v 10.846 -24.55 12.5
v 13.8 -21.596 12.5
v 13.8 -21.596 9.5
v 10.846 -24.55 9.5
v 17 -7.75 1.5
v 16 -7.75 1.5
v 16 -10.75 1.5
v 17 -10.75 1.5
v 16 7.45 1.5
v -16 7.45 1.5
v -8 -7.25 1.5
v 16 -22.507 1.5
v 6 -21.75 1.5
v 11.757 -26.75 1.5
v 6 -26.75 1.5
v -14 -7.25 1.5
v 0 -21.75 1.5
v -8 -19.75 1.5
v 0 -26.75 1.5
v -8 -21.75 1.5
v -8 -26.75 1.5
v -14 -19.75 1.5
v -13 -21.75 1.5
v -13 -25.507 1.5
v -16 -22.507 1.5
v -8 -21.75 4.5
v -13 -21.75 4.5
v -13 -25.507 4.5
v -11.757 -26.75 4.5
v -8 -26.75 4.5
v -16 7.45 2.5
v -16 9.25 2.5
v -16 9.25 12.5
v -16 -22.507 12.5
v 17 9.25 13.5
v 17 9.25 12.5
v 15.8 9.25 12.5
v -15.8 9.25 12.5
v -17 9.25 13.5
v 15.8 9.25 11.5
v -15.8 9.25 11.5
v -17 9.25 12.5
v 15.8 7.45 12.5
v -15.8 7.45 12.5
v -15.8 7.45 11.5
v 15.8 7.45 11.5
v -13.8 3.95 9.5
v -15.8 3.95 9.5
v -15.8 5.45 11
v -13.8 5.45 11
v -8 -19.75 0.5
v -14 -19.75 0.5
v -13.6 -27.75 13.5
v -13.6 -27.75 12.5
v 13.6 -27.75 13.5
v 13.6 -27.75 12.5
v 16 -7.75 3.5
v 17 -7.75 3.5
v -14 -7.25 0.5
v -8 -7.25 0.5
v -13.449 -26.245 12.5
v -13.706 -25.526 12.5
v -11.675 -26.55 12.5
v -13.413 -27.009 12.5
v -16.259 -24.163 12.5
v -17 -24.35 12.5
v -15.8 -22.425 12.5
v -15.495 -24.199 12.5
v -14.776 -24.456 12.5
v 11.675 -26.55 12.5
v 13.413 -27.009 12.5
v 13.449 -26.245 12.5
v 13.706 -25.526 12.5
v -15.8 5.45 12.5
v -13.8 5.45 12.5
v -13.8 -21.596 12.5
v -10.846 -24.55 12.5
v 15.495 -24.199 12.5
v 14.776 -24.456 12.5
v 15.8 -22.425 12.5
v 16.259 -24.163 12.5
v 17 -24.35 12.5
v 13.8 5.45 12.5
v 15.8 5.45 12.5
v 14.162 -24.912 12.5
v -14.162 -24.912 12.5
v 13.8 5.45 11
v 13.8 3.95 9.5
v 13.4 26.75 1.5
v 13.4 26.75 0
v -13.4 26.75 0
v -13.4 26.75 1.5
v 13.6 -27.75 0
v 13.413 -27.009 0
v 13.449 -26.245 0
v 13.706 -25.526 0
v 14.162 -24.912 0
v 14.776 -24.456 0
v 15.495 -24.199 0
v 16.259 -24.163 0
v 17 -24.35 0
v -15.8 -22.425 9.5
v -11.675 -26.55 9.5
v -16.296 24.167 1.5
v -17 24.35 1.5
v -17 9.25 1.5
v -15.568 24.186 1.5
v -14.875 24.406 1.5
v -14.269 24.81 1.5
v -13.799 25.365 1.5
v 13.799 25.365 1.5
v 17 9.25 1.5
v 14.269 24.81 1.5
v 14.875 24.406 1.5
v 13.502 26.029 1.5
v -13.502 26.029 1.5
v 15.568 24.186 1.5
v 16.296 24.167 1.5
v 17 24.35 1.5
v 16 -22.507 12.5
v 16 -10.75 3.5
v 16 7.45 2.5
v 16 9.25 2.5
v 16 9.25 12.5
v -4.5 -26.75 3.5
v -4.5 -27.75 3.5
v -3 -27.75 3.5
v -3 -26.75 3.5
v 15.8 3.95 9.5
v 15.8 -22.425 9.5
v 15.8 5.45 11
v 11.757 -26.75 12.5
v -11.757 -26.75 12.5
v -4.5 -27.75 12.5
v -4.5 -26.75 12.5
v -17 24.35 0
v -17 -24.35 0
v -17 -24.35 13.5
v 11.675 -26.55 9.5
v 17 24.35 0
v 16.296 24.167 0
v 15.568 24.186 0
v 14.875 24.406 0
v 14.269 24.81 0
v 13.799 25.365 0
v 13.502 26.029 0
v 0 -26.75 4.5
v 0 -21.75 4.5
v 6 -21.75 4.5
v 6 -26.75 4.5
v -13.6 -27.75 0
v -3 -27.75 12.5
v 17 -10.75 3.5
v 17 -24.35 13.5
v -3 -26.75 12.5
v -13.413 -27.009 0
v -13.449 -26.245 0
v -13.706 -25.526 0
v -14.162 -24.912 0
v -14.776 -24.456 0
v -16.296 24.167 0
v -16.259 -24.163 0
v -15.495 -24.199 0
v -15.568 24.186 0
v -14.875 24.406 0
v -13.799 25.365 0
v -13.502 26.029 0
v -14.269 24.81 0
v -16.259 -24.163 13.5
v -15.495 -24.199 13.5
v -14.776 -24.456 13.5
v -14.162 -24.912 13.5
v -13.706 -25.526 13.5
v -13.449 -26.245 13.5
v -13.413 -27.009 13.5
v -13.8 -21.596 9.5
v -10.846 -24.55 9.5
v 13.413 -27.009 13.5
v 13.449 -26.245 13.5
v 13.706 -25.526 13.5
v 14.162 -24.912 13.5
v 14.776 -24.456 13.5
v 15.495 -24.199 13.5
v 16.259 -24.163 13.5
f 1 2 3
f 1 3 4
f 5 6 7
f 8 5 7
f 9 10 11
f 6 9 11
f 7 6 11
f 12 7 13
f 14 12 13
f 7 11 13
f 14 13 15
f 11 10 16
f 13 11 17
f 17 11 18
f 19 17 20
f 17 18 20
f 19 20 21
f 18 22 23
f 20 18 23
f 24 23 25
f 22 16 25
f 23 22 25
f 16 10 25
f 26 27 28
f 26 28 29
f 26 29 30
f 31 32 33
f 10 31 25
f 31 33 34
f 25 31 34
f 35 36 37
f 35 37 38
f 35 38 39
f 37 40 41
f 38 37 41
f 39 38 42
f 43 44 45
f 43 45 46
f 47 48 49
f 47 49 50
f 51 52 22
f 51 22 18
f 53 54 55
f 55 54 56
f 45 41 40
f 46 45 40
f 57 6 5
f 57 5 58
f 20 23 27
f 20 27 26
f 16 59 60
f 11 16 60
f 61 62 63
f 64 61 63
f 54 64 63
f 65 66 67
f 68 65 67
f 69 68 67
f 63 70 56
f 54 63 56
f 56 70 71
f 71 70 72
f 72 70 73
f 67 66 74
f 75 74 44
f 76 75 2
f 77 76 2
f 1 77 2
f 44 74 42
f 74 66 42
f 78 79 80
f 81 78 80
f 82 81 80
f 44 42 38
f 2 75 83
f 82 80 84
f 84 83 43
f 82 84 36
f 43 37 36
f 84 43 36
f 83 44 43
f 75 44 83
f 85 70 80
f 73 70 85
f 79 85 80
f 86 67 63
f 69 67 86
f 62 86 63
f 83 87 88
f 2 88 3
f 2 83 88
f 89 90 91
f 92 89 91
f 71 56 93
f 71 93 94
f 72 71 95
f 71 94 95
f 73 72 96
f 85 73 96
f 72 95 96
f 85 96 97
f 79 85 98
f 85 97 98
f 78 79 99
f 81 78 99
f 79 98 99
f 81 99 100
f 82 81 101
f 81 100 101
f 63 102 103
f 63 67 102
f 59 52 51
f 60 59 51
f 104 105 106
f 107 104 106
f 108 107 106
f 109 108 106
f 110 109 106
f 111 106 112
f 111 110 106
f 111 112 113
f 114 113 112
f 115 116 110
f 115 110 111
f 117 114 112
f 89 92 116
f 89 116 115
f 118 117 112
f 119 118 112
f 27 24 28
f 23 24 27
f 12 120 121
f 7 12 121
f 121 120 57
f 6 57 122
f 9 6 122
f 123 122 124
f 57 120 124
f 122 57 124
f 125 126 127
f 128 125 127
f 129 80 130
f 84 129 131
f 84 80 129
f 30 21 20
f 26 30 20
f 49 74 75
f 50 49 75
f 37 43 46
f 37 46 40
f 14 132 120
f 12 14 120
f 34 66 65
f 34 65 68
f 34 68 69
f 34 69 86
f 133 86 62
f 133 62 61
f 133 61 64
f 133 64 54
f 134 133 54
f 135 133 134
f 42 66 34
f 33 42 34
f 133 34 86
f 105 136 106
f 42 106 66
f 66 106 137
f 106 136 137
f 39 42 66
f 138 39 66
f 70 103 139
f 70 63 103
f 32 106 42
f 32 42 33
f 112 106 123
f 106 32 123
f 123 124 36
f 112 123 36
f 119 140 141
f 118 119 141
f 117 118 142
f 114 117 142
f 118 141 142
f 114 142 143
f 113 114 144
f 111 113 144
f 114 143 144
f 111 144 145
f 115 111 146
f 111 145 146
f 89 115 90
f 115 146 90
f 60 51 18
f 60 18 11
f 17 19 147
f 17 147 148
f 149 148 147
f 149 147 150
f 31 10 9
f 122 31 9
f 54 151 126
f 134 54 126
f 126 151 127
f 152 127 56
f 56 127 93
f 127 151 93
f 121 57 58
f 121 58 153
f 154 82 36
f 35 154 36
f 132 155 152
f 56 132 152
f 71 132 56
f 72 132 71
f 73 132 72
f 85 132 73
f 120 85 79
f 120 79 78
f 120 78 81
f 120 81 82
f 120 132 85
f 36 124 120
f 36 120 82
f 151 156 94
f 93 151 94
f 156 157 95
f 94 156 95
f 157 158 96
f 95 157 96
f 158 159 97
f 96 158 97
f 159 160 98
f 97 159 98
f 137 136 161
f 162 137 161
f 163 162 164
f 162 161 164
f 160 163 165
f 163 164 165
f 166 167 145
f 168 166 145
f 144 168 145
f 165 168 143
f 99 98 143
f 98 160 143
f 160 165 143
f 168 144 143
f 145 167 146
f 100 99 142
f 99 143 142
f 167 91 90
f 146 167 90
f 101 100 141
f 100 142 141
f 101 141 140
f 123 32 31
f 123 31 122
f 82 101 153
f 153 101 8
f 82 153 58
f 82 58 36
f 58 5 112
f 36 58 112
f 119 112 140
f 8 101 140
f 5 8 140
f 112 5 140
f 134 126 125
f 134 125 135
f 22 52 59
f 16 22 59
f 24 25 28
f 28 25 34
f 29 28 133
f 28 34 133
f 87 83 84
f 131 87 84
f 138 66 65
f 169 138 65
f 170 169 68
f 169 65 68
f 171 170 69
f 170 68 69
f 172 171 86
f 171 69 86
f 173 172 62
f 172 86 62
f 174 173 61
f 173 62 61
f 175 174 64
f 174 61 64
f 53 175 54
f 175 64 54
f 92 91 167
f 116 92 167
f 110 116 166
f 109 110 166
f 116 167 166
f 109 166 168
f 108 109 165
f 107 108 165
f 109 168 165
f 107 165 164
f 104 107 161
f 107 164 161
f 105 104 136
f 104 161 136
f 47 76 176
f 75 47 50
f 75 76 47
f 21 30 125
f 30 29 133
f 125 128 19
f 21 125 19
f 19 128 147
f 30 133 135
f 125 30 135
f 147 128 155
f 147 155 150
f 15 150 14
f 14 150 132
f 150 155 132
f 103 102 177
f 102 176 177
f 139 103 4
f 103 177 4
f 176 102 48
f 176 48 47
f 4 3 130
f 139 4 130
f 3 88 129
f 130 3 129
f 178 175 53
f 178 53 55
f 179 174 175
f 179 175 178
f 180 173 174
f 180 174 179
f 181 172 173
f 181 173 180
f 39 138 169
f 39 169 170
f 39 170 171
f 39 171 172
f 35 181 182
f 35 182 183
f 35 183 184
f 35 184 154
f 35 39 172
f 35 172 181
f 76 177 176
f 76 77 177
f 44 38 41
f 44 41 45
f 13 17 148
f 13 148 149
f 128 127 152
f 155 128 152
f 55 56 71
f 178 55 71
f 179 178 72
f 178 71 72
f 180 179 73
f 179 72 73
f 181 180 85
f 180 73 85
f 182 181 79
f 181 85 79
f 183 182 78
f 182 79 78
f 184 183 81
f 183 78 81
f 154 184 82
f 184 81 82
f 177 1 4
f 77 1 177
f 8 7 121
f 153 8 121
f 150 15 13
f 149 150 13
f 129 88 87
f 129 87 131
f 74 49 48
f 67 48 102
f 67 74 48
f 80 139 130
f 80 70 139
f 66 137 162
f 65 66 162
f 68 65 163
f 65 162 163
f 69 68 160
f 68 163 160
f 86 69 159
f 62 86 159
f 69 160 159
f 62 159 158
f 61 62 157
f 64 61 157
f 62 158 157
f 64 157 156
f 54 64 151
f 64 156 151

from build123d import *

# Parameters (mm, degrees)
F1_W      = 6
F1_H      = 12.5
F2_DEPTH  = 12.5
F4_DEPTH  = 11
F5_W      = 6
F5_H      = 6
F5_W_2    = 5
F6_DEPTH  = 3
F7_W      = 32
F7_H      = 1.8
F8_DEPTH  = 1
F10_DEPTH = 1
F12_DEPTH = 1
F13_W     = 1.5
F13_H     = 9
F14_DEPTH = 1
F15_W     = 34
F15_H     = 2
F16_DEPTH = 25
F17_DEPTH = 2
F18_SIZE  = 1.5
F19_W     = 9.7393654287
F19_H     = 17.2347798944
F20_DEPTH = 0.5
F21_W     = 3
F21_H     = 2
F22_DEPTH = 1


with BuildPart() as f2:
    # F1 (on Top) → F2 (new body)
    with BuildSketch(Plane.XY):
        with BuildLine():
            ThreePointArc((-13.4, 26.75), (-14.5577794898, 24.5866692347), (-17, 24.35))
            Line((-17, 24.35), (-17, -24.35))
            ThreePointArc((-17, -24.35), (-14.1615223689, -24.9115223689), (-13.6, -27.75))
            Line((-13.6, -27.75), (13.6, -27.75))
            ThreePointArc((13.6, -27.75), (14.1615223689, -24.9115223689), (17, -24.35))
            Line((17, -24.35), (17, 24.35))
            ThreePointArc((17, 24.35), (14.5577794898, 24.5866692347), (13.4, 26.75))
            Line((13.4, 26.75), (-13.4, 26.75))
        make_face()
        with Locations((-11, -13.5)):
            Rectangle(F1_W, F1_H, mode=Mode.SUBTRACT)
    extrude(amount=F2_DEPTH)

    # F3 (on face) → F4 (cut)
    with BuildSketch(Plane.XY.offset(12.5)):
        Polygon((-17, 9.25), (-16, 9.25), (-16, -22.5073593129), (-11.7573593129, -26.75), (11.7573593129, -26.75), (16, -22.5073593129), (16, 9.25), (17, 9.25), (17, 26.75), (-17, 26.75), align=None)
    extrude(amount=-F4_DEPTH, mode=Mode.SUBTRACT)

    # F5 (on face) → F6 (join)
    with BuildSketch(Plane.XY.offset(1.5)):
        with Locations((3, -24.75)):
            Rectangle(F5_W, F5_H)
        with Locations((-10.5, -24.75)):
            Rectangle(F5_W_2, F5_H)
    extrude(amount=F6_DEPTH)

    # F7 (on face) → F8 (join)
    with BuildSketch(Plane.XY.offset(1.5)):
        with Locations((0, 8.35)):
            Rectangle(F7_W, F7_H)
    extrude(amount=F8_DEPTH)

    # F13 (on face) → F14 (cut, through all)
    with BuildSketch(Plane.XZ.offset(27.75)):
        with Locations((-3.75, 8)):
            Rectangle(F13_W, F13_H)
    extrude(amount=-F14_DEPTH, mode=Mode.SUBTRACT)

    # F19 (on face) → F20 (join)
    with BuildSketch(Plane(origin=(0, 0, 0), x_dir=(1, 0, 0), z_dir=(0, 0, -1))):
        with Locations((-9.9391005933, 13.7184206396)):
            Rectangle(F19_W, F19_H)
    extrude(amount=-F20_DEPTH)

    # F21 (on face) → F22 (cut, through all)
    with BuildSketch(Plane(origin=(16, 0, 0), x_dir=(0, -1, 0), z_dir=(-1, 0, 0))):
        with Locations((9.25, 2.5)):
            Rectangle(F21_W, F21_H)
    extrude(amount=-F22_DEPTH, mode=Mode.SUBTRACT)


with BuildPart() as f10:
    # F9 (on face) → F10 (new body)
    with BuildSketch(Plane.XY.offset(12.5)):
        with BuildLine():
            Line((17, 9.25), (-17, 9.25))
            Line((-17, 9.25), (-17, -24.35))
            ThreePointArc((-17, -24.35), (-14.1615223689, -24.9115223689), (-13.6, -27.75))
            Line((-13.6, -27.75), (13.6, -27.75))
            ThreePointArc((13.6, -27.75), (14.1615223689, -24.9115223689), (17, -24.35))
            Line((17, -24.35), (17, 9.25))
        make_face()
    extrude(amount=F10_DEPTH)

    # F11 (on face) → F12 (join)
    with BuildSketch(Plane.XY.offset(12.5)):
        Polygon((15.8, 9.25), (-15.8, 9.25), (-15.8, -22.4245166004), (-11.6745166004, -26.55), (11.6745166004, -26.55), (15.8, -22.4245166004), align=None)
        Polygon((13.8, 7.45), (13.8, -21.5960894757), (10.8460894757, -24.55), (-10.8460894757, -24.55), (-13.8, -21.5960894757), (-13.8, 7.45), align=None, mode=Mode.SUBTRACT)
    extrude(amount=-F12_DEPTH)

    # F15 (on face) → F16 (cut)
    with BuildSketch(Plane(origin=(0, 0, 12.5), x_dir=(1, 0, 0), z_dir=(0, 0, -1))):
        with Locations((0, -6.45)):
            Rectangle(F15_W, F15_H)
    extrude(amount=F16_DEPTH, mode=Mode.SUBTRACT)

    # F17 (add): a face of the model
    f17_faces = [f10.faces().sort_by_distance(p)[0] for p in [
        (13.419252011, -24.169252011, 11.5),
    ]]
    extrude(f17_faces, amount=F17_DEPTH)

    # F18
    f18_edges = [f10.edges().sort_by_distance(p)[0] for p in [
        (-14.8, 5.45, 9.5),
        (14.8, 5.45, 9.5),
    ]]
    chamfer(f18_edges, length=F18_SIZE)


solid = Compound([f2.part, f10.part])
